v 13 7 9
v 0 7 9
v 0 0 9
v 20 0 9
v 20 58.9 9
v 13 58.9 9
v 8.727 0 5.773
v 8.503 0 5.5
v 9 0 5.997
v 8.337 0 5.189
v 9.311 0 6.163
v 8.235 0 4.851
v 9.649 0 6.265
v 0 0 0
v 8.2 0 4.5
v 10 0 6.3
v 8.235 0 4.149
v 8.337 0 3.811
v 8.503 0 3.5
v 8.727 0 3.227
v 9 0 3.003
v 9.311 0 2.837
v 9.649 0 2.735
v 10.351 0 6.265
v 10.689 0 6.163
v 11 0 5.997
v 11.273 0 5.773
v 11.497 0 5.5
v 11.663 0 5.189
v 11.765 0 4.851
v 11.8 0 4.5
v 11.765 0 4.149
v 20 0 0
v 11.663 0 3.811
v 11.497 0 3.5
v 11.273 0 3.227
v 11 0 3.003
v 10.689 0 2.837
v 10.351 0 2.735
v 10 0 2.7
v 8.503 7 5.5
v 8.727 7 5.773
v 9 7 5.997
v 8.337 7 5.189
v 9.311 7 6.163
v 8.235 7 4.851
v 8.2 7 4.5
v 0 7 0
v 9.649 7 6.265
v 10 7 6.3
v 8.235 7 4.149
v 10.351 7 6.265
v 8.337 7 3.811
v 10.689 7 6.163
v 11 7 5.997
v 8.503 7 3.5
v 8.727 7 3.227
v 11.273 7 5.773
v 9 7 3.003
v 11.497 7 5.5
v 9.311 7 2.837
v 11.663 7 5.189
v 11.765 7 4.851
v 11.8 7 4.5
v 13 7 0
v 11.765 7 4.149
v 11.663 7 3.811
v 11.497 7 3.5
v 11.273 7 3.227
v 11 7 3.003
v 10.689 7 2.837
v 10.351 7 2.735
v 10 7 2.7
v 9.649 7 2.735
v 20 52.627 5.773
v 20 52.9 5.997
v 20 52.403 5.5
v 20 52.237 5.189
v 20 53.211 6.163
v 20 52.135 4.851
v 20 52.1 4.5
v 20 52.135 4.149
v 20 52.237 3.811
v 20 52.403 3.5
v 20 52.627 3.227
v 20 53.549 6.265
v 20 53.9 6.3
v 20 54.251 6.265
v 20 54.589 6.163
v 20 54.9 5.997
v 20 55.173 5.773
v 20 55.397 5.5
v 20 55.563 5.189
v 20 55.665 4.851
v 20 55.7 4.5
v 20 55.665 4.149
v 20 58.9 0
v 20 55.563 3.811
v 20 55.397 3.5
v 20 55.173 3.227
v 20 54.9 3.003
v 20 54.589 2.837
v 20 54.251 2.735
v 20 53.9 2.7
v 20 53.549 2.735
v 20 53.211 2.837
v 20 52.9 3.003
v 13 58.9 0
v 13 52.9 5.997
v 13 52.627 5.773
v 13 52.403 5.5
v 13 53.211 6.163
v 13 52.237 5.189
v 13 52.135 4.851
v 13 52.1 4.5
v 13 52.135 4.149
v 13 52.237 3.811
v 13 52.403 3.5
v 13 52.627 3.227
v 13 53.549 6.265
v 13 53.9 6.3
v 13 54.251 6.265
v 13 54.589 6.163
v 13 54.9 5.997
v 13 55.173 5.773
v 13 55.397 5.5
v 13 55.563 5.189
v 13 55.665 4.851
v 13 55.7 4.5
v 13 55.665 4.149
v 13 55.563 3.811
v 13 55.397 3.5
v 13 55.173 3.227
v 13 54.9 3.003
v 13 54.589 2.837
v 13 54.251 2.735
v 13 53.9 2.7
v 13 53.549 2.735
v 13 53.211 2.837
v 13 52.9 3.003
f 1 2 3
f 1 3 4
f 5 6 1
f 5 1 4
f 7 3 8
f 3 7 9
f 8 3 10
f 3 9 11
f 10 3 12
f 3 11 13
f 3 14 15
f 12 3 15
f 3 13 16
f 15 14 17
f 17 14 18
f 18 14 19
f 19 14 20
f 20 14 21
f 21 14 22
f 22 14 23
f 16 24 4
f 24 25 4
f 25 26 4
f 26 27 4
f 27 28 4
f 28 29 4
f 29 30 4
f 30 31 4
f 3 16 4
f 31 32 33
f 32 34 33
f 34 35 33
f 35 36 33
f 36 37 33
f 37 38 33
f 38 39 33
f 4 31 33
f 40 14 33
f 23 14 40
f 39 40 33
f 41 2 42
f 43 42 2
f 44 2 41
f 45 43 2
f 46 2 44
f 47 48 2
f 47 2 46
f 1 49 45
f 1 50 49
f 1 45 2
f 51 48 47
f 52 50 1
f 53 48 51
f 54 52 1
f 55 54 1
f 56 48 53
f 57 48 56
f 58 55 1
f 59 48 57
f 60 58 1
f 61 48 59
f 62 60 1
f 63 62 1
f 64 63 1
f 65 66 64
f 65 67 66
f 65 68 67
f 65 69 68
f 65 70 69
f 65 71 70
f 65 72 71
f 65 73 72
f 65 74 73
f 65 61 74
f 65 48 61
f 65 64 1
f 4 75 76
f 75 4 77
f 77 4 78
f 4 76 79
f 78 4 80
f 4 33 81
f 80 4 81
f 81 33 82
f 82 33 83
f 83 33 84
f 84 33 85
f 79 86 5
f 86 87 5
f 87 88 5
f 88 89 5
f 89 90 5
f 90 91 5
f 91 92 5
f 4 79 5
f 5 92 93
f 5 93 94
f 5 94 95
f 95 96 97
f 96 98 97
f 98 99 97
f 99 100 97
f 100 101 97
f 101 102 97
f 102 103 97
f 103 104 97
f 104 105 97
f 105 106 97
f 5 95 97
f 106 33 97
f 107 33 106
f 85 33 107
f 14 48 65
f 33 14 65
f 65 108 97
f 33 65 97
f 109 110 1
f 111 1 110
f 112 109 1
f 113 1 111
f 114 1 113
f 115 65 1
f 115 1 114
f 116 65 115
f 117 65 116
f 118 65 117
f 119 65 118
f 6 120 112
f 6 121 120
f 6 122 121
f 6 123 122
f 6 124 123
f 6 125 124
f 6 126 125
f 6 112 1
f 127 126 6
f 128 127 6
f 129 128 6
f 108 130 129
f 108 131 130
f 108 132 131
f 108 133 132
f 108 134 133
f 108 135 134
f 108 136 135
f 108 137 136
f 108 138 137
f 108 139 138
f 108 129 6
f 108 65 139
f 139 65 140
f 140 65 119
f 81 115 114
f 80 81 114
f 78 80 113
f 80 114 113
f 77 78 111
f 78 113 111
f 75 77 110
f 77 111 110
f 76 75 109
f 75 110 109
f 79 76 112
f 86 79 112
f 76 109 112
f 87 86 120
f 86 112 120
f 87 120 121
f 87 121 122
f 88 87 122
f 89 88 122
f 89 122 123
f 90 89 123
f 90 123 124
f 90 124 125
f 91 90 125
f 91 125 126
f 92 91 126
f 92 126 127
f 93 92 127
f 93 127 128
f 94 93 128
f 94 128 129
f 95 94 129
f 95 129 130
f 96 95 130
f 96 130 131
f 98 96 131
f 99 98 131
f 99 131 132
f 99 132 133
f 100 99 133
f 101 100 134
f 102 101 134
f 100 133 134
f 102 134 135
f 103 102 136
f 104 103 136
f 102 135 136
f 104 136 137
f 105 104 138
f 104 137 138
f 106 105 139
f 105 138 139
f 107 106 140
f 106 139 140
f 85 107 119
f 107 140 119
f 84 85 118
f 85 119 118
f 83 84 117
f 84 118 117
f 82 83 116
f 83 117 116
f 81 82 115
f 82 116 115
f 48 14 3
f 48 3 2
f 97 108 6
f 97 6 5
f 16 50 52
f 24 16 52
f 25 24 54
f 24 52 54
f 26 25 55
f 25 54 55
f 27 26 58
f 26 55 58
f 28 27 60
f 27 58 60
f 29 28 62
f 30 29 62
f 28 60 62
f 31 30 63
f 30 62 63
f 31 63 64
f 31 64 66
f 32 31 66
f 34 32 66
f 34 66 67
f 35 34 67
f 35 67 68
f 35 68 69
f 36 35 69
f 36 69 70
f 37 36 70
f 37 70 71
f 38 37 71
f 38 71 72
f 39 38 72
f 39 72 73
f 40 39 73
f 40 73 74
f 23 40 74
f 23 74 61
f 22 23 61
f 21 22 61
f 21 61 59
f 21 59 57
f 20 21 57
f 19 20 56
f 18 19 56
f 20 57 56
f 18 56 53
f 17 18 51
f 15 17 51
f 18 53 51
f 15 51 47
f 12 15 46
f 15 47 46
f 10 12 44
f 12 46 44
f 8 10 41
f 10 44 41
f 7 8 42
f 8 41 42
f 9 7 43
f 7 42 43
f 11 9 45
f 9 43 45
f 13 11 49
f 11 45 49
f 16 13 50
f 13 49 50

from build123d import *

# Parameters (mm, degrees)
ESQUISSE1_W             = 20
ESQUISSE1_H             = 7
ESQUISSE1_W_2           = 7
ESQUISSE1_H_2           = 51.9
BOSS_EXTRU_1_DEPTH      = 9
ESQUISSE2_R             = 1.8
ENL_V_MAT_EXTRU_1_DEPTH = 9
ESQUISSE3_R             = 1.8
ENL_V_MAT_EXTRU_2_DEPTH = 9


with BuildPart() as part:
    # Esquisse1 → Boss.-Extru.1 (new body)
    with BuildSketch(Plane.XY):
        with Locations((10, 3.5)):
            Rectangle(ESQUISSE1_W, ESQUISSE1_H)
        with Locations((16.5, 32.95)):
            Rectangle(ESQUISSE1_W_2, ESQUISSE1_H_2)
    extrude(amount=BOSS_EXTRU_1_DEPTH)

    # Esquisse2 → Enlèv. mat.-Extru.1 (cut)
    with BuildSketch(Plane(origin=(0, 7, 0), x_dir=(1, 0, 0), z_dir=(0, 1, 0))):
        with Locations(Location((10, -4.5, 0), (0, 0, 270))):
            Circle(ESQUISSE2_R)
    extrude(amount=-ENL_V_MAT_EXTRU_1_DEPTH, mode=Mode.SUBTRACT)

    # Esquisse3 → Enlèv. mat.-Extru.2 (cut)
    with BuildSketch(Plane.ZY.offset(-13)):
        with Locations(Location((4.5, 53.9, 0), (0, 0, 270))):
            Circle(ESQUISSE3_R)
    extrude(amount=-ENL_V_MAT_EXTRU_2_DEPTH, mode=Mode.SUBTRACT)


solid = part.part
